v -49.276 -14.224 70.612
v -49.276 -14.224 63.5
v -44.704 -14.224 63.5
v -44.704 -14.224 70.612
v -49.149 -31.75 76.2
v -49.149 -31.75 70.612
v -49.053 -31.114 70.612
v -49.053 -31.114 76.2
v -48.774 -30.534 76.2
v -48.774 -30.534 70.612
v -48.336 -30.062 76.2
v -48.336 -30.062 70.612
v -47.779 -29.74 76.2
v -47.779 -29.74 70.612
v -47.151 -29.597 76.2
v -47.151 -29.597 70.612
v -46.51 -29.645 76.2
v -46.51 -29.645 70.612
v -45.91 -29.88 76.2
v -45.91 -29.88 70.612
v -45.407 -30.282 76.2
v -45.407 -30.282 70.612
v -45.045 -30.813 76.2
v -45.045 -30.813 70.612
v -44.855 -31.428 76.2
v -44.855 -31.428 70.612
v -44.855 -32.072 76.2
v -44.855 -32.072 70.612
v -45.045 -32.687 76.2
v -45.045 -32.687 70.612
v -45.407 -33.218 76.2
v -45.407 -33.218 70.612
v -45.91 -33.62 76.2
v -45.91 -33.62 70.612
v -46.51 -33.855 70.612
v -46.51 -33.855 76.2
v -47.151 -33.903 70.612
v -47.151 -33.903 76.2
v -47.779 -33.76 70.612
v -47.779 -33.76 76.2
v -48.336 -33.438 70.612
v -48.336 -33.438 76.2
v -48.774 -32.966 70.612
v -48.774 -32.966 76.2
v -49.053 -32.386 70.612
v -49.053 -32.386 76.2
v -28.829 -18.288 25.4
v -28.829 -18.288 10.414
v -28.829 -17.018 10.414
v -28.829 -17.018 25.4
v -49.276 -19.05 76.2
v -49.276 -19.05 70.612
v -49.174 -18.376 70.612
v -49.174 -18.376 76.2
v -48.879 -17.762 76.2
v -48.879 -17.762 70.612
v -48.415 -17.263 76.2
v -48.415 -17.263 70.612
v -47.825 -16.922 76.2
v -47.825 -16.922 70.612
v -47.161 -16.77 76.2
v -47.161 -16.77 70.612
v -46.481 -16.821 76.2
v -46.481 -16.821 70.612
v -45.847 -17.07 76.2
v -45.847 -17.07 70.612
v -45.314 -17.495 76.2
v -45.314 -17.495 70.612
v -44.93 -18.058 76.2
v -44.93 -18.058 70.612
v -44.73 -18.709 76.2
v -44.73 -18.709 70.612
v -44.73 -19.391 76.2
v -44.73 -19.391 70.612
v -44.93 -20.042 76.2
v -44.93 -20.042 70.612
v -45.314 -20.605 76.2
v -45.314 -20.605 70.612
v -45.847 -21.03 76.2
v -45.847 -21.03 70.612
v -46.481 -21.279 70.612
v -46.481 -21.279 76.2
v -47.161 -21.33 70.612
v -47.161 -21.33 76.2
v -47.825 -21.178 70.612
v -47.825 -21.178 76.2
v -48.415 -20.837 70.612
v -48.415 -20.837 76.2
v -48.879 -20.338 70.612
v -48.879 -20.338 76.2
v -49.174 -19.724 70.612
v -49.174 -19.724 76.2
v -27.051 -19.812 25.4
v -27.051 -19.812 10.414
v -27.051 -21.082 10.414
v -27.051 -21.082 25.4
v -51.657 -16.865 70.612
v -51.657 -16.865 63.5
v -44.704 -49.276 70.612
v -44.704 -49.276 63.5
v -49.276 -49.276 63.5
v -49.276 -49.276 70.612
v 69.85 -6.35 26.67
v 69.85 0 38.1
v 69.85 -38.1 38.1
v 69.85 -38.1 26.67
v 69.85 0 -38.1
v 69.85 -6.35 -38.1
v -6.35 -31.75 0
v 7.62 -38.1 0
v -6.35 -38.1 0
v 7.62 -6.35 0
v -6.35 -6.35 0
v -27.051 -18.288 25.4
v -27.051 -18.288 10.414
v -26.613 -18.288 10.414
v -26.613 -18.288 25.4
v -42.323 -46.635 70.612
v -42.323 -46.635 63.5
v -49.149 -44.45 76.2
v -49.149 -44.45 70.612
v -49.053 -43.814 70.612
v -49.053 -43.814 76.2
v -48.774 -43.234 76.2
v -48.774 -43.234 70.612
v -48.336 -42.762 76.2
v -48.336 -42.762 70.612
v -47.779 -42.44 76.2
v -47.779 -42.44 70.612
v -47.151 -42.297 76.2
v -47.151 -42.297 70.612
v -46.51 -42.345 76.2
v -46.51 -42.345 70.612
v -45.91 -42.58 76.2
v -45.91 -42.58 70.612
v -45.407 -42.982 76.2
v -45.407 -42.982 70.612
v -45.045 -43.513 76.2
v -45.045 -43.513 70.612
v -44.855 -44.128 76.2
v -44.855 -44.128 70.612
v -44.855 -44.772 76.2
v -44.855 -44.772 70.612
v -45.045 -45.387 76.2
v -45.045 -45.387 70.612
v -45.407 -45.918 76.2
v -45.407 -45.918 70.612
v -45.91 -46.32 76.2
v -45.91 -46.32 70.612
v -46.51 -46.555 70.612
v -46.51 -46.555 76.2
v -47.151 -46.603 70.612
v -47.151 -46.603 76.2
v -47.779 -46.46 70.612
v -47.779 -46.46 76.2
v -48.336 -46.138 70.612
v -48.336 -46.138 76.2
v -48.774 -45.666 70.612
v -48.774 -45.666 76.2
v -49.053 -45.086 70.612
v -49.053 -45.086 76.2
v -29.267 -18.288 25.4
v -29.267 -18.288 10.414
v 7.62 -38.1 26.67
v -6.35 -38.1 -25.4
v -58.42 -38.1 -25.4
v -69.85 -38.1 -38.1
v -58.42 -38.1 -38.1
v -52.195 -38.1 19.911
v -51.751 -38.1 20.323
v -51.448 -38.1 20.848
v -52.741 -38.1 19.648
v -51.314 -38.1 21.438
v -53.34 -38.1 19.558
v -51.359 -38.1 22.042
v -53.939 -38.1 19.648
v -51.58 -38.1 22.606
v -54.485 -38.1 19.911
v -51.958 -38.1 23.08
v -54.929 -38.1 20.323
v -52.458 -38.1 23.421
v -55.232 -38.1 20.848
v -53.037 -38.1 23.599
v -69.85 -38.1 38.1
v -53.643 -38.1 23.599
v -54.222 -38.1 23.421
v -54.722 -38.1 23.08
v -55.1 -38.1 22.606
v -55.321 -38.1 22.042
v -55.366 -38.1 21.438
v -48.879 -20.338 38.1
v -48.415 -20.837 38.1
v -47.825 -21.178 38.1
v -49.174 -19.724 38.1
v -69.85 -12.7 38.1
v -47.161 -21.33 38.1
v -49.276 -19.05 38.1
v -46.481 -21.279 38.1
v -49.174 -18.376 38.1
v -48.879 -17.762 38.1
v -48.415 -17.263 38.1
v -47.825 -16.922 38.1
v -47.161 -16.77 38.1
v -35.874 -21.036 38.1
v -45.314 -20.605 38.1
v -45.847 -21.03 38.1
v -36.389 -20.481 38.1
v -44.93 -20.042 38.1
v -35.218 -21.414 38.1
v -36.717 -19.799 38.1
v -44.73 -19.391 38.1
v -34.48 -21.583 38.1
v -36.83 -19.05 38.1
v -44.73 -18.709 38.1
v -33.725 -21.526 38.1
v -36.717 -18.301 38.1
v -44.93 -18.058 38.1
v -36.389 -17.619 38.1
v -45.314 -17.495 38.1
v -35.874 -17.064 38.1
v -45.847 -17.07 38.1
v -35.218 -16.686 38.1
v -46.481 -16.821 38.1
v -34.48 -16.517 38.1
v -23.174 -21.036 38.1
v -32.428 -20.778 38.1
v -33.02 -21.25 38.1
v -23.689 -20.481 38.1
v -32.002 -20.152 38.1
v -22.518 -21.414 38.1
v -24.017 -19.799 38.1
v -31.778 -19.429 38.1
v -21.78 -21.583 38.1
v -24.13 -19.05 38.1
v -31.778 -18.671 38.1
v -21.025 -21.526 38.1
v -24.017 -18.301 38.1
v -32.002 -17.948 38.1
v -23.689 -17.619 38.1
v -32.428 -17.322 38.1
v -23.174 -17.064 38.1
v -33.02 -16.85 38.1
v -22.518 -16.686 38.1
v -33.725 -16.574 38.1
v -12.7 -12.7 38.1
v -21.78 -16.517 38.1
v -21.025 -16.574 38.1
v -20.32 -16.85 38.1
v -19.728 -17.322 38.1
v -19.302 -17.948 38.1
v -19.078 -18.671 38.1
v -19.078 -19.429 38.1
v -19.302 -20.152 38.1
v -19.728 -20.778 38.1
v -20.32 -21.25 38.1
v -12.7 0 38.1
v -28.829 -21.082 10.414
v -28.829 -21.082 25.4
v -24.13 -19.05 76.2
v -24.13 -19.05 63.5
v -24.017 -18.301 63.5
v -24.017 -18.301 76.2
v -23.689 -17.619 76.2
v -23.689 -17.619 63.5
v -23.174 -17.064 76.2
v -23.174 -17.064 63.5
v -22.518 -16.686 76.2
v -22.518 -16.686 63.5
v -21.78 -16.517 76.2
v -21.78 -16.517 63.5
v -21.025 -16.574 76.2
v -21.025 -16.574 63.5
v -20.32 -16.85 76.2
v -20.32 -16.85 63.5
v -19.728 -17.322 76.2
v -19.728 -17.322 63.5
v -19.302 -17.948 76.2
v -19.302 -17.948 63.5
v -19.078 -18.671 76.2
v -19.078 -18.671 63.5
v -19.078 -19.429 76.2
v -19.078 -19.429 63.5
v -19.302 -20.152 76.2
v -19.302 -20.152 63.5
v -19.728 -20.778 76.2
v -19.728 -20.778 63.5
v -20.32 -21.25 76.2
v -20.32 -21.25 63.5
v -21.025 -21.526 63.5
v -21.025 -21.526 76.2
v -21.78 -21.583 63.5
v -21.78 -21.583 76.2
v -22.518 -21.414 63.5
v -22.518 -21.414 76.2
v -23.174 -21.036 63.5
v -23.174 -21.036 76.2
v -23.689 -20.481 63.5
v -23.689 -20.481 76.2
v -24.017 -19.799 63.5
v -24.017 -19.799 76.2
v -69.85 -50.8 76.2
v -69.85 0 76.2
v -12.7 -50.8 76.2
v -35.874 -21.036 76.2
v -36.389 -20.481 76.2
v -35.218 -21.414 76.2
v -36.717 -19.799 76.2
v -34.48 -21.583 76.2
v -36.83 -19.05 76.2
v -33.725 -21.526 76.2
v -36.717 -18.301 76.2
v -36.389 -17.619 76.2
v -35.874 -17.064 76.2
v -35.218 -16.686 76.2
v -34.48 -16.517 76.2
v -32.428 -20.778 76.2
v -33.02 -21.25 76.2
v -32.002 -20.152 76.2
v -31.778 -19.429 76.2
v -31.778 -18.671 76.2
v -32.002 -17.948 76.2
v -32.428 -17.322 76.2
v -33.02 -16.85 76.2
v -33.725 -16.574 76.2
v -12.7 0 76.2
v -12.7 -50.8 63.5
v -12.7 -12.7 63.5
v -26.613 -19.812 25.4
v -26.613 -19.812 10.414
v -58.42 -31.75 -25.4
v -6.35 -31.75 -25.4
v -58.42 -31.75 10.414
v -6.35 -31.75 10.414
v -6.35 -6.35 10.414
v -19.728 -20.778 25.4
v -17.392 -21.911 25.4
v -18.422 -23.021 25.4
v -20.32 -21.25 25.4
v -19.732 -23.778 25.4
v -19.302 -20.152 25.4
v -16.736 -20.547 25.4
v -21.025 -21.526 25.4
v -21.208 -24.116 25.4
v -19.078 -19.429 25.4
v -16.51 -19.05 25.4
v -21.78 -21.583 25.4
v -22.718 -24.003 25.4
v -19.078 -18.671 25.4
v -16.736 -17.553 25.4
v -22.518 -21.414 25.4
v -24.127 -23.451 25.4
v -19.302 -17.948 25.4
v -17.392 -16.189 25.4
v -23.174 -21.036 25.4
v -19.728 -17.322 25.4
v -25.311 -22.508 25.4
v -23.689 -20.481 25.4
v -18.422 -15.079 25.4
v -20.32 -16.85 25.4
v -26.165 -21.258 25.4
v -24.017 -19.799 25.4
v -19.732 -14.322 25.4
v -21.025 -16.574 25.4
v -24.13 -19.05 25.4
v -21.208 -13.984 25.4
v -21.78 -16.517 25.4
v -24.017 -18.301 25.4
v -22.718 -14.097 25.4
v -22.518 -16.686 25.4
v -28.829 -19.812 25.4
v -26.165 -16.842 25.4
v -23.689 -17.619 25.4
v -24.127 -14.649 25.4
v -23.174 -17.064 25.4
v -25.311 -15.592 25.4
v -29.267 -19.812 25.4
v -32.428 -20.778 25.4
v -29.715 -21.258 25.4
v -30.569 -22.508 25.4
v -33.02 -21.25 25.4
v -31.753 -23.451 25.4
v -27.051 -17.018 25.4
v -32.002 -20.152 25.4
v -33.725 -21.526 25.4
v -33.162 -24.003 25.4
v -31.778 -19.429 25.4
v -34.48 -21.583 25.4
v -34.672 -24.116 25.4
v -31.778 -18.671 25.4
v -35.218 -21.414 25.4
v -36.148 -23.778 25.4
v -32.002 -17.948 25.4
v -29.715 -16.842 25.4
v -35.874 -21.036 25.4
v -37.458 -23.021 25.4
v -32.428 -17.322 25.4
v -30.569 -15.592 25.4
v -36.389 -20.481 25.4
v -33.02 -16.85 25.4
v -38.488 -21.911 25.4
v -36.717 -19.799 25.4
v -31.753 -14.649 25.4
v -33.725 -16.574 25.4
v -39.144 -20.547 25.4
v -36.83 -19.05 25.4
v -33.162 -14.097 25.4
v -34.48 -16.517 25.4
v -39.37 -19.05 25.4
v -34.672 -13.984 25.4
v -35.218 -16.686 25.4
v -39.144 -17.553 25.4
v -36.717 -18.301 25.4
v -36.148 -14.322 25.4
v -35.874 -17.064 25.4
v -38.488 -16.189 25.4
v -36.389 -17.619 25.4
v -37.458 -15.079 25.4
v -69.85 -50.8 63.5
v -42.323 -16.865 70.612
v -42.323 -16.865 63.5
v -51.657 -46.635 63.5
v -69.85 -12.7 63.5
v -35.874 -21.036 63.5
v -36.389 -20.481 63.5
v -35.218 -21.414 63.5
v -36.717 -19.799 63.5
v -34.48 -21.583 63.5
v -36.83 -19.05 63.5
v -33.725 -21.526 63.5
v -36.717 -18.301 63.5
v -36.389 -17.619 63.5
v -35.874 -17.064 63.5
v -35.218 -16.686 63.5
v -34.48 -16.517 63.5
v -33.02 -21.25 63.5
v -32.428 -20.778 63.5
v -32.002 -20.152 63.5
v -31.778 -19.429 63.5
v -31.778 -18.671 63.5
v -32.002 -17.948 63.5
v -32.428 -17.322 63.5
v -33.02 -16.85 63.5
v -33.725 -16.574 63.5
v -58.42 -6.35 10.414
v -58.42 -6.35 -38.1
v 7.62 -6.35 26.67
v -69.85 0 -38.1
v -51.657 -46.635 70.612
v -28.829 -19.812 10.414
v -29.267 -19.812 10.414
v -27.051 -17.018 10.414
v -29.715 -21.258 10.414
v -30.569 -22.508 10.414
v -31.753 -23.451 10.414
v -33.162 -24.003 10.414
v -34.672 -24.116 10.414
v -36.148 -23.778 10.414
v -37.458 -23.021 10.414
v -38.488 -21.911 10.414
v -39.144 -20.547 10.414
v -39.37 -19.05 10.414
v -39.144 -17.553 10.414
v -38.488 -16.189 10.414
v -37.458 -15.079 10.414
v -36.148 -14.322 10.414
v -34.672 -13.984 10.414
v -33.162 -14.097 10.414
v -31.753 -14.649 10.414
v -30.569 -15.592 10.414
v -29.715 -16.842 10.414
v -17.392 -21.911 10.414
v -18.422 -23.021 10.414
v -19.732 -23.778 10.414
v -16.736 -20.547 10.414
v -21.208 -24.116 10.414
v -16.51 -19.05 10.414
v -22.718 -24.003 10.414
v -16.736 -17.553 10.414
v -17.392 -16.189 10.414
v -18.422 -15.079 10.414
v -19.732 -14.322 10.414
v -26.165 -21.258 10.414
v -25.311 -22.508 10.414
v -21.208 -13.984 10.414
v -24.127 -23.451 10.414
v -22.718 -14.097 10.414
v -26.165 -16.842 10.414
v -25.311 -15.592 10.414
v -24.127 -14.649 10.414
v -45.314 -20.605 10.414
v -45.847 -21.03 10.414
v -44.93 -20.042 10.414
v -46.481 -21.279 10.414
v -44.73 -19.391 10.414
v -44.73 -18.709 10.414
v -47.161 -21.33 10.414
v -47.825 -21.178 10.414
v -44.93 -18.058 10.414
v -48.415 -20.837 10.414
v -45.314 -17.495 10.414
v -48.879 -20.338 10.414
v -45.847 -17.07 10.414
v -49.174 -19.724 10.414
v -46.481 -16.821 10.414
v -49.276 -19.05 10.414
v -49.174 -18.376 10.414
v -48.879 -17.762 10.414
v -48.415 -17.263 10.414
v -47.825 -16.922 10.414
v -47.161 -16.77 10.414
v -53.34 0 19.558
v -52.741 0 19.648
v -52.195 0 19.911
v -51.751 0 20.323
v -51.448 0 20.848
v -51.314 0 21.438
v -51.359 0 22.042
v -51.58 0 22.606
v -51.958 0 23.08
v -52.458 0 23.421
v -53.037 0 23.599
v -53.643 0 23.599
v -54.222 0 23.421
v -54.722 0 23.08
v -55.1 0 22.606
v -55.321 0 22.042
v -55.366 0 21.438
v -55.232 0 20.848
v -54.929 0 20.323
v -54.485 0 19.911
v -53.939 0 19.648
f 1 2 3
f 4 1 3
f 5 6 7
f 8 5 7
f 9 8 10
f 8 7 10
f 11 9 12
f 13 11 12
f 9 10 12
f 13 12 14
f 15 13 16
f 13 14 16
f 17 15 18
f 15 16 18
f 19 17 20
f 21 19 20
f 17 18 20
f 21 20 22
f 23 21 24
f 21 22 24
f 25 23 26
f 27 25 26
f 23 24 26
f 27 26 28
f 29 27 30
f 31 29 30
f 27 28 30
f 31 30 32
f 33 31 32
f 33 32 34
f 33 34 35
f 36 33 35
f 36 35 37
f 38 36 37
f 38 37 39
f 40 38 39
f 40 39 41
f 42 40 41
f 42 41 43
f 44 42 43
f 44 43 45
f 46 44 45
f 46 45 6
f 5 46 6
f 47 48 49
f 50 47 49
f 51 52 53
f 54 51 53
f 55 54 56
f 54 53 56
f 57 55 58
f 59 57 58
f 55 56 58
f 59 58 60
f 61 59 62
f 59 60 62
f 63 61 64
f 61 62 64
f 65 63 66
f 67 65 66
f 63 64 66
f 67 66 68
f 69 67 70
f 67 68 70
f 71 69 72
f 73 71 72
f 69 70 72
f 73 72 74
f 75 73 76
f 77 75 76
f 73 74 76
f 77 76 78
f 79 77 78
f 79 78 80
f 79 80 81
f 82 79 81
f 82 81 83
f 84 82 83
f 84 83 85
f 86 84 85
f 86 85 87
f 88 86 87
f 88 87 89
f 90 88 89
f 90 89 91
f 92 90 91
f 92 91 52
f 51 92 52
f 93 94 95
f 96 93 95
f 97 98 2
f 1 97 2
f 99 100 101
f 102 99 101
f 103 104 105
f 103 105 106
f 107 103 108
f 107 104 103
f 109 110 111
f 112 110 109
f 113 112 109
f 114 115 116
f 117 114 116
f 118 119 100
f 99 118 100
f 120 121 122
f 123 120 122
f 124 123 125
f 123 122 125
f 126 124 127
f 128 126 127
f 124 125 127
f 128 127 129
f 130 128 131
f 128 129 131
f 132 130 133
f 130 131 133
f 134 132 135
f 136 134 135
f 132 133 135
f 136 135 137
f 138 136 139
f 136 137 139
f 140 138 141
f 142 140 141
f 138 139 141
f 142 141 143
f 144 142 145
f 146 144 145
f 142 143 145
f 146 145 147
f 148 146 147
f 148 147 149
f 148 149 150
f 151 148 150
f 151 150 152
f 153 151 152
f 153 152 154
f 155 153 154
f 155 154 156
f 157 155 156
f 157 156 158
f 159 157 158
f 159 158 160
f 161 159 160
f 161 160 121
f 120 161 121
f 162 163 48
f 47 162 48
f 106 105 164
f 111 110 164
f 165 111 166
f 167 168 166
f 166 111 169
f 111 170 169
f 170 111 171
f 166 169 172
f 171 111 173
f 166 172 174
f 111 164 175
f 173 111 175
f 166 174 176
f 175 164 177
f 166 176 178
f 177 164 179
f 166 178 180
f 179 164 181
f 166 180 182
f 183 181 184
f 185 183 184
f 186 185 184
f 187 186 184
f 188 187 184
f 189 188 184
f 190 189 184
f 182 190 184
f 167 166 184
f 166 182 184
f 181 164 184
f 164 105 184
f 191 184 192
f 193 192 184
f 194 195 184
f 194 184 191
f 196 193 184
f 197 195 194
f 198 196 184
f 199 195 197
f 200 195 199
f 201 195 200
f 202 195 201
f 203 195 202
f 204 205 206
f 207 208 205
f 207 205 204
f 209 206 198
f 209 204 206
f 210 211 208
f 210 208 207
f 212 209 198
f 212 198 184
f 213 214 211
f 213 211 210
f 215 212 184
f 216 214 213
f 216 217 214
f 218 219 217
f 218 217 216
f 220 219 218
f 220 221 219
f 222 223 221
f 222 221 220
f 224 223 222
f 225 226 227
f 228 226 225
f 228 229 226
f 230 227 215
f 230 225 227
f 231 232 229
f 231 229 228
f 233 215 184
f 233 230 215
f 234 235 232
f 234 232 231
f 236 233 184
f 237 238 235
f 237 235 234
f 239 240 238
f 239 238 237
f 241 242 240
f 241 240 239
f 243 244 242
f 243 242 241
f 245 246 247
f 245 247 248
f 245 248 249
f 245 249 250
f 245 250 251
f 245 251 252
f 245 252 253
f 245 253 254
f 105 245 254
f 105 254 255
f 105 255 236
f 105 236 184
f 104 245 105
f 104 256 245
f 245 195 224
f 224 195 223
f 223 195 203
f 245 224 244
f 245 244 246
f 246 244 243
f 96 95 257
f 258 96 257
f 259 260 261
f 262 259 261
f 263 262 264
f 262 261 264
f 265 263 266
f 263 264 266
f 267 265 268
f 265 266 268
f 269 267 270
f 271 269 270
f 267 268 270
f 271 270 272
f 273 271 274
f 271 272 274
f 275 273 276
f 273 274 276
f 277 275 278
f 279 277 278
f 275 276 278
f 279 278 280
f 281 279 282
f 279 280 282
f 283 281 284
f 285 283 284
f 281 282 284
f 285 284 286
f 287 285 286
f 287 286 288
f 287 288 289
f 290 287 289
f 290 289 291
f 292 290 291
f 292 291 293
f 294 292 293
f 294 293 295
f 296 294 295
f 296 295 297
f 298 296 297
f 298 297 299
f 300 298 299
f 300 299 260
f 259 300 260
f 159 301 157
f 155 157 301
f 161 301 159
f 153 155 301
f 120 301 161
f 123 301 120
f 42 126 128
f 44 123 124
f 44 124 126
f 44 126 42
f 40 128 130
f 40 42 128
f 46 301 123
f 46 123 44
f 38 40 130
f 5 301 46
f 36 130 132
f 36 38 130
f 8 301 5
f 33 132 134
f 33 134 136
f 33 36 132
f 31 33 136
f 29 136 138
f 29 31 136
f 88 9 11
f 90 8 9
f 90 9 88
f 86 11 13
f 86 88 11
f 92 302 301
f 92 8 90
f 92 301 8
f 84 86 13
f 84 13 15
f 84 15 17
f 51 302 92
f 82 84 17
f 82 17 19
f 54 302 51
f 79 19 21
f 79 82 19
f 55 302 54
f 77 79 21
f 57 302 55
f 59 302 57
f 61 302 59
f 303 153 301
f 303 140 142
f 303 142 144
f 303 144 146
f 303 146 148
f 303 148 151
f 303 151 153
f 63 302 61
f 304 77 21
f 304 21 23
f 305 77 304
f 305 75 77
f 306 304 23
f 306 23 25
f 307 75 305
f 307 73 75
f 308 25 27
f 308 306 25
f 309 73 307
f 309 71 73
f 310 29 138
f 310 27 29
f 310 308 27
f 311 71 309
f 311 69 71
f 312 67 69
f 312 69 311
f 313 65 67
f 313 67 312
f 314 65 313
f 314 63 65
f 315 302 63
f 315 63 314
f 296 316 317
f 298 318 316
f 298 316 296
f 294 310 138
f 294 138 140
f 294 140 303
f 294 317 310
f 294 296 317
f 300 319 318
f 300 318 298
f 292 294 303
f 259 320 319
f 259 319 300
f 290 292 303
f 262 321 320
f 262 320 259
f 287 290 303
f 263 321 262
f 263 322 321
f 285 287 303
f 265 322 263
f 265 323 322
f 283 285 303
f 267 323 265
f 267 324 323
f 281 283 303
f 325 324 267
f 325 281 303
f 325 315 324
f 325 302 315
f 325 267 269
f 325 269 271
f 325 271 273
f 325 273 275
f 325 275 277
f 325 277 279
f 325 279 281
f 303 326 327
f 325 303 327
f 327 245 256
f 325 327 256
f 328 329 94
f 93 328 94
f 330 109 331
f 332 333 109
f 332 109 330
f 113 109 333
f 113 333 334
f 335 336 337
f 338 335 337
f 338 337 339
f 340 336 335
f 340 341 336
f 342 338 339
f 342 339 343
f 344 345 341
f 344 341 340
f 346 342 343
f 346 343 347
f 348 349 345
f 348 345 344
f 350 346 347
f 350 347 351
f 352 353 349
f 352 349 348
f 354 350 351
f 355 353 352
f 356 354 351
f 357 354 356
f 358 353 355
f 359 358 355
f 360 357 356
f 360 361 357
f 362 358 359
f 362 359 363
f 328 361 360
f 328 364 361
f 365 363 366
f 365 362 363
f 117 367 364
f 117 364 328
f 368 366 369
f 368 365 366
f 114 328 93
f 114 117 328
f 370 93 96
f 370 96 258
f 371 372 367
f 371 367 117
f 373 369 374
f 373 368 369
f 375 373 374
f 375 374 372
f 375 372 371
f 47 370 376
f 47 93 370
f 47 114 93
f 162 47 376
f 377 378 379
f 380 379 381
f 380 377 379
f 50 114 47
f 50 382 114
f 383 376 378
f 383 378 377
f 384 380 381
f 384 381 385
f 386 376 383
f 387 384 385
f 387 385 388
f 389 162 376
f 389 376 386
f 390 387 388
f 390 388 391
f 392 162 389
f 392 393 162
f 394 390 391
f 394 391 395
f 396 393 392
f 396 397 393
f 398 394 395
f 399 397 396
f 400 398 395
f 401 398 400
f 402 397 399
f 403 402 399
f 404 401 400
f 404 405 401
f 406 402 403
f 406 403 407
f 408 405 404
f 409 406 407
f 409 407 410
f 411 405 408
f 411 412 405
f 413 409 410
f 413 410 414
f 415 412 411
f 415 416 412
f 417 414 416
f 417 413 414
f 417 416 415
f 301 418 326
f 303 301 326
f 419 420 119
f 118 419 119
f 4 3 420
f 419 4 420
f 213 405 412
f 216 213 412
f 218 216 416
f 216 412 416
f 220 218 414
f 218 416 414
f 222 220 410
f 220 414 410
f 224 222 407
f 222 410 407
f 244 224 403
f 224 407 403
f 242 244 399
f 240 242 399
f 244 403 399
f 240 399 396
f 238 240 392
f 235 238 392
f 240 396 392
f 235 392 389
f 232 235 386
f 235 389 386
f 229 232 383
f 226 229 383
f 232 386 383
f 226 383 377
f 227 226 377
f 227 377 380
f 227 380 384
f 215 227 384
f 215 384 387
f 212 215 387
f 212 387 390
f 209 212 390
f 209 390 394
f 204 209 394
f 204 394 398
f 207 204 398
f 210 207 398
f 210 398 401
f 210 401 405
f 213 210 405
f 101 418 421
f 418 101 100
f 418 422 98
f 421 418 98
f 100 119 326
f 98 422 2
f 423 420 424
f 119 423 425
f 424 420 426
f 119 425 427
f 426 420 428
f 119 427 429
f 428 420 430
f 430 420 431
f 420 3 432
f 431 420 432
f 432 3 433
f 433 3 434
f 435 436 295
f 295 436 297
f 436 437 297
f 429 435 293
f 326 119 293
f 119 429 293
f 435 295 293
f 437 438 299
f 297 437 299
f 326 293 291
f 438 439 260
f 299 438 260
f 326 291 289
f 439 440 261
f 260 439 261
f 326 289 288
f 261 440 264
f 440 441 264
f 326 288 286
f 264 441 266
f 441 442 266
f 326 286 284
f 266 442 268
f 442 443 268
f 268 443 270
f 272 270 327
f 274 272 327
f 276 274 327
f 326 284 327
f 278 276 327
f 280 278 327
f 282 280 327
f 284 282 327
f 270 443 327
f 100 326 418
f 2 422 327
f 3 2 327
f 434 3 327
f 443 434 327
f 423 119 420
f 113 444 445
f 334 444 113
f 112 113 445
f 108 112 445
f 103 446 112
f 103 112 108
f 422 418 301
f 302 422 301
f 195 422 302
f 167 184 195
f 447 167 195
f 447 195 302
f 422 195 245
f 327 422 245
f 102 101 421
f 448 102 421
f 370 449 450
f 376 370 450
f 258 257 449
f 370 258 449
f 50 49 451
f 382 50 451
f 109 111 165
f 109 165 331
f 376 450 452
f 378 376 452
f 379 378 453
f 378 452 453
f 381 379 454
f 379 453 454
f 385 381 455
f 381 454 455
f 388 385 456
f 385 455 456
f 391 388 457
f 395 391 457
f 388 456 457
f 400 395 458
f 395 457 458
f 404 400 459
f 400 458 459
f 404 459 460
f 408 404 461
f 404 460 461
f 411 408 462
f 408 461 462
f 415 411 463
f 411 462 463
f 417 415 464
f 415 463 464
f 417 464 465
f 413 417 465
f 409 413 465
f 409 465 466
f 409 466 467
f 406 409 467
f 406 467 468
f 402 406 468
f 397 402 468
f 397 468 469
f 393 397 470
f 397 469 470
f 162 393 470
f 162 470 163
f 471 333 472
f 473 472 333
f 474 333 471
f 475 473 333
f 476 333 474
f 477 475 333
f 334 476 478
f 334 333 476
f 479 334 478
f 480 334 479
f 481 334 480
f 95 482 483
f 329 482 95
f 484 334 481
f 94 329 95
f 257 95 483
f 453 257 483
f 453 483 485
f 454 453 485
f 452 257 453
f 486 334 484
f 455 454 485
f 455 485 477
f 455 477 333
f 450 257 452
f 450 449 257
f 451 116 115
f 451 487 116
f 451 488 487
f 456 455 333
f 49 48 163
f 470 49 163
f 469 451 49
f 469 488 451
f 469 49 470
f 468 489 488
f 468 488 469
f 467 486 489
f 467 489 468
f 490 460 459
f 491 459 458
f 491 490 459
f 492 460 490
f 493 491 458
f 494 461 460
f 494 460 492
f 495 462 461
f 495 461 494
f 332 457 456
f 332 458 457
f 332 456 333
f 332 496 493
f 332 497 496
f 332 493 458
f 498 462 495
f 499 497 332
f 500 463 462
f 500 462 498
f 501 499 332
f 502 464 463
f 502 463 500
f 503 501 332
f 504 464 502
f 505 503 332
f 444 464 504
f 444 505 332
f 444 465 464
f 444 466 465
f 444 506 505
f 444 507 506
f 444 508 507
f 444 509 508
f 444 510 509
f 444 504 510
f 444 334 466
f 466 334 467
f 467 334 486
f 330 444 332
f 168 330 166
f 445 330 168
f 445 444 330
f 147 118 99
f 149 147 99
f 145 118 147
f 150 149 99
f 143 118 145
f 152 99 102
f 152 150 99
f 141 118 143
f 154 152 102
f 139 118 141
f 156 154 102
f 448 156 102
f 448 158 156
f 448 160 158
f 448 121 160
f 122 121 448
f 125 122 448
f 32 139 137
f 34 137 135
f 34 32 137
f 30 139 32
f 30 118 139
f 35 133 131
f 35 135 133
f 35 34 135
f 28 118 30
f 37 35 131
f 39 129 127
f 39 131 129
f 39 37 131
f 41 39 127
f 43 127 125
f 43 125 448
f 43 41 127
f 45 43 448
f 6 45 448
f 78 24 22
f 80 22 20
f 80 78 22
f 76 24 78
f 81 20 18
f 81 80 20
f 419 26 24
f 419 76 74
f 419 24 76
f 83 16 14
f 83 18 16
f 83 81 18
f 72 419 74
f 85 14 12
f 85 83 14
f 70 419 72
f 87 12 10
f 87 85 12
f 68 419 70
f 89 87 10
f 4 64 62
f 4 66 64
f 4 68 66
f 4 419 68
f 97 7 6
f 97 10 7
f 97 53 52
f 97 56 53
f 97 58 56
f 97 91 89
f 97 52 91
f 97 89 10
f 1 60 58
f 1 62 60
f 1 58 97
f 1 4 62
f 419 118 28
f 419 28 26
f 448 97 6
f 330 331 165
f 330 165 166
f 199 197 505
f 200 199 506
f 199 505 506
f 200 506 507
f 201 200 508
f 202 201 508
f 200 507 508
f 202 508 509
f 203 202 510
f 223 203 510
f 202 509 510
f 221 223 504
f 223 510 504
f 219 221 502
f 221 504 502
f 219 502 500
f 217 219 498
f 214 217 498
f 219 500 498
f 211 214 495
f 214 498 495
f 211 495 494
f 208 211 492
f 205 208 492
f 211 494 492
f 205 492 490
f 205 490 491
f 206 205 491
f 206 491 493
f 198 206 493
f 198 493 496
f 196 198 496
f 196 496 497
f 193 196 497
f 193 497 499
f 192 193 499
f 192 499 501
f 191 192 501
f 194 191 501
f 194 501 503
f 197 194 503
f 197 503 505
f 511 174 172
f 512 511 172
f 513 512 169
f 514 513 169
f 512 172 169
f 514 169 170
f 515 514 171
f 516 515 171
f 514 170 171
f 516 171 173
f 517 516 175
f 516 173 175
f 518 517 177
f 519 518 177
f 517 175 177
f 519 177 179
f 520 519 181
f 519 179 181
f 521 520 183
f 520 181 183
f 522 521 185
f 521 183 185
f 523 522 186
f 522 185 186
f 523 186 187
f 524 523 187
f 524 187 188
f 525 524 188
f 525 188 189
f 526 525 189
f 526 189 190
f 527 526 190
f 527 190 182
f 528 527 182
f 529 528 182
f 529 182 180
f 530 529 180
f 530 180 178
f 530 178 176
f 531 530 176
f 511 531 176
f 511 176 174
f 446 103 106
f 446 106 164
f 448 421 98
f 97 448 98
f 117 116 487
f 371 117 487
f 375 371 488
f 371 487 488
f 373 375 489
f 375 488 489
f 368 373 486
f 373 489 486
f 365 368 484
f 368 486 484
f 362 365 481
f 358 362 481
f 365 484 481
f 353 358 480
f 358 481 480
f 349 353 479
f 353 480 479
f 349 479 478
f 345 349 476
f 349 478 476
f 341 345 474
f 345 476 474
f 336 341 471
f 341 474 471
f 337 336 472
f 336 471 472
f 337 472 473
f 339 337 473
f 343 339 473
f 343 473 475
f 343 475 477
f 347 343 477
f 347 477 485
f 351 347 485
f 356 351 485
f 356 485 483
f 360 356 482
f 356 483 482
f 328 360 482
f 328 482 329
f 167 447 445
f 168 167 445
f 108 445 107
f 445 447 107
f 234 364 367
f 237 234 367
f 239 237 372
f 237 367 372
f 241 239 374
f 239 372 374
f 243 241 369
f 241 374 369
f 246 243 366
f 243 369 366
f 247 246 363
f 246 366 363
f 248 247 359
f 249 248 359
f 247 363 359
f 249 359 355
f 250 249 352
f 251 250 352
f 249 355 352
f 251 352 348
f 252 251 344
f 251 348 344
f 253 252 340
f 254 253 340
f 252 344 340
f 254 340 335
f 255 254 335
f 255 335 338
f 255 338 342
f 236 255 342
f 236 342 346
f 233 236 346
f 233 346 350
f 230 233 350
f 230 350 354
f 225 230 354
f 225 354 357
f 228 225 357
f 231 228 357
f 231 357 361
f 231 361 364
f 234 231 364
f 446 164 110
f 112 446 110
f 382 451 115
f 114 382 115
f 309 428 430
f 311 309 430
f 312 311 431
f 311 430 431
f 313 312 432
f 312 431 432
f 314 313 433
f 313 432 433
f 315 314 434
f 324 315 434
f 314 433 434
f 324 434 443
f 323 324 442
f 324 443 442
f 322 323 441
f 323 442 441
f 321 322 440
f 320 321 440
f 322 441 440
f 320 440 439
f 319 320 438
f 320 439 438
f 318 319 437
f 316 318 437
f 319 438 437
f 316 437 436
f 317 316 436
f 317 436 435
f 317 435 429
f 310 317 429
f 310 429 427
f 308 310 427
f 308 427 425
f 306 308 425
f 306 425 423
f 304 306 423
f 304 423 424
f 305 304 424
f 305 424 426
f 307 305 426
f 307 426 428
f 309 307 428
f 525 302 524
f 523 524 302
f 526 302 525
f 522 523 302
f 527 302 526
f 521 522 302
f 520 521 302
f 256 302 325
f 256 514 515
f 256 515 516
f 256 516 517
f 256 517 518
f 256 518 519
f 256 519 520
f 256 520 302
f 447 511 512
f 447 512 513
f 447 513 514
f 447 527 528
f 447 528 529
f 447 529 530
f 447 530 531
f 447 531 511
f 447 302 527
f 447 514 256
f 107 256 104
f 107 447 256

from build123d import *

# Parameters (mm, degrees)
SKETCH1_W               = 139.7
SKETCH1_H               = 76.2
BOSS_EXTRUDE1_DEPTH     = 38.1
CUT_EXTRUDE1_DEPTH      = 89.217019333
CUT_EXTRUDE1_DEPTH_BACK = 31.75
SKETCH3_R               = 2.032
CUT_EXTRUDE2_DEPTH      = 89.217019333
SKETCH4_W               = 52.07
SKETCH4_H               = 25.4
CUT_EXTRUDE3_DEPTH      = 10.414
SKETCH7_W               = 57.15
SKETCH7_H               = 12.7
BOSS_EXTRUDE2_DEPTH     = 25.4
SKETCH8_W               = 57.15
SKETCH8_H               = 50.8
BOSS_EXTRUDE3_DEPTH     = 12.7
SKETCH5_R               = 2.286
SKETCH5_R_2             = 2.54
CUT_EXTRUDE4_DEPTH      = 109.570070904
CUT_EXTRUDE5_DEPTH      = 14.986
CUT_EXTRUDE6_DEPTH      = 7.112
SKETCH10_R              = 2.159
CUT_EXTRUDE7_DEPTH      = 139.84509874
SKETCH11_W              = 52.07
SKETCH11_H              = 6.35
BOSS_EXTRUDE4_DEPTH     = 25.4


with BuildPart() as part:
    # Sketch1 → Boss-Extrude1 (new body)
    with BuildSketch(Plane(origin=(0, 0, 0), x_dir=(1, 0, 0), z_dir=(0, 1, 0))):
        Rectangle(SKETCH1_W, SKETCH1_H)
    extrude(amount=-BOSS_EXTRUDE1_DEPTH)

    # Sketch2 → Cut-Extrude1 (cut, two sides: drawn at the far end of the back side and taken through both)
    with BuildSketch(Plane.XZ.offset(38.1).offset(-CUT_EXTRUDE1_DEPTH_BACK)):
        Polygon((387.819108191, 26.67), (69.85, 26.67), (7.62, 26.67), (7.62, 0), (-58.42, 0), (-58.42, -38.1), (-58.42, -356.069108191), (355.598009183, -838.77657978), (801.837117374, -456.037471588), align=None)
    extrude(amount=CUT_EXTRUDE1_DEPTH + CUT_EXTRUDE1_DEPTH_BACK, mode=Mode.SUBTRACT)

    # Sketch3 → Cut-Extrude2 (cut, through all)
    with BuildSketch(Plane.XZ.offset(38.1)):
        with Locations(Location((-53.34, 21.59, 0), (0, 0, 270))):
            Circle(SKETCH3_R)
    extrude(amount=-CUT_EXTRUDE2_DEPTH, mode=Mode.SUBTRACT)

    # Sketch4 → Cut-Extrude3 (cut)
    with BuildSketch(Plane(origin=(0, 0, 0), x_dir=(-1, 0, 0), z_dir=(0, 0, -1))):
        with Locations((32.385, -19.05)):
            Rectangle(SKETCH4_W, SKETCH4_H)
    extrude(amount=-CUT_EXTRUDE3_DEPTH, mode=Mode.SUBTRACT)

    # Sketch7 → Boss-Extrude2 (add)
    with BuildSketch(Plane.XY.offset(38.1)):
        with Locations((-41.275, -6.35)):
            Rectangle(SKETCH7_W, SKETCH7_H)
    extrude(amount=BOSS_EXTRUDE2_DEPTH)

    # Sketch8 → Boss-Extrude3 (add)
    with BuildSketch(Plane.XY.offset(63.5)):
        with Locations((-41.275, -25.4)):
            Rectangle(SKETCH8_W, SKETCH8_H)
    extrude(amount=BOSS_EXTRUDE3_DEPTH)

    # Sketch5 → Cut-Extrude4 (cut, through all)
    with BuildSketch(Plane(origin=(0, 0, 10.414), x_dir=(-1, 0, 0), z_dir=(0, 0, -1))):
        with Locations((46.99, -19.05)):
            Circle(SKETCH5_R)
        with Locations((34.29, -19.05)):
            Circle(SKETCH5_R_2)
        with Locations((21.59, -19.05)):
            Circle(SKETCH5_R_2)
    extrude(amount=-CUT_EXTRUDE4_DEPTH, mode=Mode.SUBTRACT)

    # Sketch6 → Cut-Extrude5 (cut)
    with BuildSketch(Plane(origin=(0, 0, 10.414), x_dir=(-1, 0, 0), z_dir=(0, 0, -1))):
        with BuildLine():
            Line((27.051, -18.288), (26.612524863, -18.288))
            ThreePointArc((26.612524863, -18.288), (16.51, -19.05), (26.612524863, -19.812))
            Line((26.612524863, -19.812), (27.051, -19.812))
            Line((27.051, -19.812), (27.051, -21.082))
            Line((27.051, -21.082), (28.829, -21.082))
            Line((28.829, -21.082), (28.829, -19.812))
            Line((28.829, -19.812), (29.267475137, -19.812))
            ThreePointArc((29.267475137, -19.812), (39.37, -19.05), (29.267475137, -18.288))
            Line((29.267475137, -18.288), (28.829, -18.288))
            Line((28.829, -18.288), (28.829, -17.018))
            Line((28.829, -17.018), (27.051, -17.018))
            Line((27.051, -17.018), (27.051, -18.288))
        make_face()
    extrude(amount=-CUT_EXTRUDE5_DEPTH, mode=Mode.SUBTRACT)

    # Sketch9 → Cut-Extrude6 (cut)
    with BuildSketch(Plane(origin=(0, 0, 63.5), x_dir=(-1, 0, 0), z_dir=(0, 0, -1))):
        Polygon((42.323188216, -16.865376771), (42.323188216, -46.634623229), (44.704, -49.276), (49.276, -49.276), (51.656811784, -46.634623229), (51.656811784, -16.865376771), (49.276, -14.224), (44.704, -14.224), align=None)
    extrude(amount=-CUT_EXTRUDE6_DEPTH, mode=Mode.SUBTRACT)

    # Sketch10 → Cut-Extrude7 (cut, through all)
    with BuildSketch(Plane(origin=(0, 0, 70.612), x_dir=(-1, 0, 0), z_dir=(0, 0, -1))):
        with Locations((46.99, -19.05)):
            Circle(SKETCH10_R)
        with Locations((46.99, -31.75)):
            Circle(SKETCH10_R)
        with Locations((46.99, -44.45)):
            Circle(SKETCH10_R)
    extrude(amount=-CUT_EXTRUDE7_DEPTH, mode=Mode.SUBTRACT)

    # Sketch11 → Boss-Extrude4 (add)
    with BuildSketch(Plane(origin=(0, 0, 0), x_dir=(-1, 0, 0), z_dir=(0, 0, -1))):
        with Locations((32.385, -34.925)):
            Rectangle(SKETCH11_W, SKETCH11_H)
    extrude(amount=BOSS_EXTRUDE4_DEPTH)


solid = part.part
